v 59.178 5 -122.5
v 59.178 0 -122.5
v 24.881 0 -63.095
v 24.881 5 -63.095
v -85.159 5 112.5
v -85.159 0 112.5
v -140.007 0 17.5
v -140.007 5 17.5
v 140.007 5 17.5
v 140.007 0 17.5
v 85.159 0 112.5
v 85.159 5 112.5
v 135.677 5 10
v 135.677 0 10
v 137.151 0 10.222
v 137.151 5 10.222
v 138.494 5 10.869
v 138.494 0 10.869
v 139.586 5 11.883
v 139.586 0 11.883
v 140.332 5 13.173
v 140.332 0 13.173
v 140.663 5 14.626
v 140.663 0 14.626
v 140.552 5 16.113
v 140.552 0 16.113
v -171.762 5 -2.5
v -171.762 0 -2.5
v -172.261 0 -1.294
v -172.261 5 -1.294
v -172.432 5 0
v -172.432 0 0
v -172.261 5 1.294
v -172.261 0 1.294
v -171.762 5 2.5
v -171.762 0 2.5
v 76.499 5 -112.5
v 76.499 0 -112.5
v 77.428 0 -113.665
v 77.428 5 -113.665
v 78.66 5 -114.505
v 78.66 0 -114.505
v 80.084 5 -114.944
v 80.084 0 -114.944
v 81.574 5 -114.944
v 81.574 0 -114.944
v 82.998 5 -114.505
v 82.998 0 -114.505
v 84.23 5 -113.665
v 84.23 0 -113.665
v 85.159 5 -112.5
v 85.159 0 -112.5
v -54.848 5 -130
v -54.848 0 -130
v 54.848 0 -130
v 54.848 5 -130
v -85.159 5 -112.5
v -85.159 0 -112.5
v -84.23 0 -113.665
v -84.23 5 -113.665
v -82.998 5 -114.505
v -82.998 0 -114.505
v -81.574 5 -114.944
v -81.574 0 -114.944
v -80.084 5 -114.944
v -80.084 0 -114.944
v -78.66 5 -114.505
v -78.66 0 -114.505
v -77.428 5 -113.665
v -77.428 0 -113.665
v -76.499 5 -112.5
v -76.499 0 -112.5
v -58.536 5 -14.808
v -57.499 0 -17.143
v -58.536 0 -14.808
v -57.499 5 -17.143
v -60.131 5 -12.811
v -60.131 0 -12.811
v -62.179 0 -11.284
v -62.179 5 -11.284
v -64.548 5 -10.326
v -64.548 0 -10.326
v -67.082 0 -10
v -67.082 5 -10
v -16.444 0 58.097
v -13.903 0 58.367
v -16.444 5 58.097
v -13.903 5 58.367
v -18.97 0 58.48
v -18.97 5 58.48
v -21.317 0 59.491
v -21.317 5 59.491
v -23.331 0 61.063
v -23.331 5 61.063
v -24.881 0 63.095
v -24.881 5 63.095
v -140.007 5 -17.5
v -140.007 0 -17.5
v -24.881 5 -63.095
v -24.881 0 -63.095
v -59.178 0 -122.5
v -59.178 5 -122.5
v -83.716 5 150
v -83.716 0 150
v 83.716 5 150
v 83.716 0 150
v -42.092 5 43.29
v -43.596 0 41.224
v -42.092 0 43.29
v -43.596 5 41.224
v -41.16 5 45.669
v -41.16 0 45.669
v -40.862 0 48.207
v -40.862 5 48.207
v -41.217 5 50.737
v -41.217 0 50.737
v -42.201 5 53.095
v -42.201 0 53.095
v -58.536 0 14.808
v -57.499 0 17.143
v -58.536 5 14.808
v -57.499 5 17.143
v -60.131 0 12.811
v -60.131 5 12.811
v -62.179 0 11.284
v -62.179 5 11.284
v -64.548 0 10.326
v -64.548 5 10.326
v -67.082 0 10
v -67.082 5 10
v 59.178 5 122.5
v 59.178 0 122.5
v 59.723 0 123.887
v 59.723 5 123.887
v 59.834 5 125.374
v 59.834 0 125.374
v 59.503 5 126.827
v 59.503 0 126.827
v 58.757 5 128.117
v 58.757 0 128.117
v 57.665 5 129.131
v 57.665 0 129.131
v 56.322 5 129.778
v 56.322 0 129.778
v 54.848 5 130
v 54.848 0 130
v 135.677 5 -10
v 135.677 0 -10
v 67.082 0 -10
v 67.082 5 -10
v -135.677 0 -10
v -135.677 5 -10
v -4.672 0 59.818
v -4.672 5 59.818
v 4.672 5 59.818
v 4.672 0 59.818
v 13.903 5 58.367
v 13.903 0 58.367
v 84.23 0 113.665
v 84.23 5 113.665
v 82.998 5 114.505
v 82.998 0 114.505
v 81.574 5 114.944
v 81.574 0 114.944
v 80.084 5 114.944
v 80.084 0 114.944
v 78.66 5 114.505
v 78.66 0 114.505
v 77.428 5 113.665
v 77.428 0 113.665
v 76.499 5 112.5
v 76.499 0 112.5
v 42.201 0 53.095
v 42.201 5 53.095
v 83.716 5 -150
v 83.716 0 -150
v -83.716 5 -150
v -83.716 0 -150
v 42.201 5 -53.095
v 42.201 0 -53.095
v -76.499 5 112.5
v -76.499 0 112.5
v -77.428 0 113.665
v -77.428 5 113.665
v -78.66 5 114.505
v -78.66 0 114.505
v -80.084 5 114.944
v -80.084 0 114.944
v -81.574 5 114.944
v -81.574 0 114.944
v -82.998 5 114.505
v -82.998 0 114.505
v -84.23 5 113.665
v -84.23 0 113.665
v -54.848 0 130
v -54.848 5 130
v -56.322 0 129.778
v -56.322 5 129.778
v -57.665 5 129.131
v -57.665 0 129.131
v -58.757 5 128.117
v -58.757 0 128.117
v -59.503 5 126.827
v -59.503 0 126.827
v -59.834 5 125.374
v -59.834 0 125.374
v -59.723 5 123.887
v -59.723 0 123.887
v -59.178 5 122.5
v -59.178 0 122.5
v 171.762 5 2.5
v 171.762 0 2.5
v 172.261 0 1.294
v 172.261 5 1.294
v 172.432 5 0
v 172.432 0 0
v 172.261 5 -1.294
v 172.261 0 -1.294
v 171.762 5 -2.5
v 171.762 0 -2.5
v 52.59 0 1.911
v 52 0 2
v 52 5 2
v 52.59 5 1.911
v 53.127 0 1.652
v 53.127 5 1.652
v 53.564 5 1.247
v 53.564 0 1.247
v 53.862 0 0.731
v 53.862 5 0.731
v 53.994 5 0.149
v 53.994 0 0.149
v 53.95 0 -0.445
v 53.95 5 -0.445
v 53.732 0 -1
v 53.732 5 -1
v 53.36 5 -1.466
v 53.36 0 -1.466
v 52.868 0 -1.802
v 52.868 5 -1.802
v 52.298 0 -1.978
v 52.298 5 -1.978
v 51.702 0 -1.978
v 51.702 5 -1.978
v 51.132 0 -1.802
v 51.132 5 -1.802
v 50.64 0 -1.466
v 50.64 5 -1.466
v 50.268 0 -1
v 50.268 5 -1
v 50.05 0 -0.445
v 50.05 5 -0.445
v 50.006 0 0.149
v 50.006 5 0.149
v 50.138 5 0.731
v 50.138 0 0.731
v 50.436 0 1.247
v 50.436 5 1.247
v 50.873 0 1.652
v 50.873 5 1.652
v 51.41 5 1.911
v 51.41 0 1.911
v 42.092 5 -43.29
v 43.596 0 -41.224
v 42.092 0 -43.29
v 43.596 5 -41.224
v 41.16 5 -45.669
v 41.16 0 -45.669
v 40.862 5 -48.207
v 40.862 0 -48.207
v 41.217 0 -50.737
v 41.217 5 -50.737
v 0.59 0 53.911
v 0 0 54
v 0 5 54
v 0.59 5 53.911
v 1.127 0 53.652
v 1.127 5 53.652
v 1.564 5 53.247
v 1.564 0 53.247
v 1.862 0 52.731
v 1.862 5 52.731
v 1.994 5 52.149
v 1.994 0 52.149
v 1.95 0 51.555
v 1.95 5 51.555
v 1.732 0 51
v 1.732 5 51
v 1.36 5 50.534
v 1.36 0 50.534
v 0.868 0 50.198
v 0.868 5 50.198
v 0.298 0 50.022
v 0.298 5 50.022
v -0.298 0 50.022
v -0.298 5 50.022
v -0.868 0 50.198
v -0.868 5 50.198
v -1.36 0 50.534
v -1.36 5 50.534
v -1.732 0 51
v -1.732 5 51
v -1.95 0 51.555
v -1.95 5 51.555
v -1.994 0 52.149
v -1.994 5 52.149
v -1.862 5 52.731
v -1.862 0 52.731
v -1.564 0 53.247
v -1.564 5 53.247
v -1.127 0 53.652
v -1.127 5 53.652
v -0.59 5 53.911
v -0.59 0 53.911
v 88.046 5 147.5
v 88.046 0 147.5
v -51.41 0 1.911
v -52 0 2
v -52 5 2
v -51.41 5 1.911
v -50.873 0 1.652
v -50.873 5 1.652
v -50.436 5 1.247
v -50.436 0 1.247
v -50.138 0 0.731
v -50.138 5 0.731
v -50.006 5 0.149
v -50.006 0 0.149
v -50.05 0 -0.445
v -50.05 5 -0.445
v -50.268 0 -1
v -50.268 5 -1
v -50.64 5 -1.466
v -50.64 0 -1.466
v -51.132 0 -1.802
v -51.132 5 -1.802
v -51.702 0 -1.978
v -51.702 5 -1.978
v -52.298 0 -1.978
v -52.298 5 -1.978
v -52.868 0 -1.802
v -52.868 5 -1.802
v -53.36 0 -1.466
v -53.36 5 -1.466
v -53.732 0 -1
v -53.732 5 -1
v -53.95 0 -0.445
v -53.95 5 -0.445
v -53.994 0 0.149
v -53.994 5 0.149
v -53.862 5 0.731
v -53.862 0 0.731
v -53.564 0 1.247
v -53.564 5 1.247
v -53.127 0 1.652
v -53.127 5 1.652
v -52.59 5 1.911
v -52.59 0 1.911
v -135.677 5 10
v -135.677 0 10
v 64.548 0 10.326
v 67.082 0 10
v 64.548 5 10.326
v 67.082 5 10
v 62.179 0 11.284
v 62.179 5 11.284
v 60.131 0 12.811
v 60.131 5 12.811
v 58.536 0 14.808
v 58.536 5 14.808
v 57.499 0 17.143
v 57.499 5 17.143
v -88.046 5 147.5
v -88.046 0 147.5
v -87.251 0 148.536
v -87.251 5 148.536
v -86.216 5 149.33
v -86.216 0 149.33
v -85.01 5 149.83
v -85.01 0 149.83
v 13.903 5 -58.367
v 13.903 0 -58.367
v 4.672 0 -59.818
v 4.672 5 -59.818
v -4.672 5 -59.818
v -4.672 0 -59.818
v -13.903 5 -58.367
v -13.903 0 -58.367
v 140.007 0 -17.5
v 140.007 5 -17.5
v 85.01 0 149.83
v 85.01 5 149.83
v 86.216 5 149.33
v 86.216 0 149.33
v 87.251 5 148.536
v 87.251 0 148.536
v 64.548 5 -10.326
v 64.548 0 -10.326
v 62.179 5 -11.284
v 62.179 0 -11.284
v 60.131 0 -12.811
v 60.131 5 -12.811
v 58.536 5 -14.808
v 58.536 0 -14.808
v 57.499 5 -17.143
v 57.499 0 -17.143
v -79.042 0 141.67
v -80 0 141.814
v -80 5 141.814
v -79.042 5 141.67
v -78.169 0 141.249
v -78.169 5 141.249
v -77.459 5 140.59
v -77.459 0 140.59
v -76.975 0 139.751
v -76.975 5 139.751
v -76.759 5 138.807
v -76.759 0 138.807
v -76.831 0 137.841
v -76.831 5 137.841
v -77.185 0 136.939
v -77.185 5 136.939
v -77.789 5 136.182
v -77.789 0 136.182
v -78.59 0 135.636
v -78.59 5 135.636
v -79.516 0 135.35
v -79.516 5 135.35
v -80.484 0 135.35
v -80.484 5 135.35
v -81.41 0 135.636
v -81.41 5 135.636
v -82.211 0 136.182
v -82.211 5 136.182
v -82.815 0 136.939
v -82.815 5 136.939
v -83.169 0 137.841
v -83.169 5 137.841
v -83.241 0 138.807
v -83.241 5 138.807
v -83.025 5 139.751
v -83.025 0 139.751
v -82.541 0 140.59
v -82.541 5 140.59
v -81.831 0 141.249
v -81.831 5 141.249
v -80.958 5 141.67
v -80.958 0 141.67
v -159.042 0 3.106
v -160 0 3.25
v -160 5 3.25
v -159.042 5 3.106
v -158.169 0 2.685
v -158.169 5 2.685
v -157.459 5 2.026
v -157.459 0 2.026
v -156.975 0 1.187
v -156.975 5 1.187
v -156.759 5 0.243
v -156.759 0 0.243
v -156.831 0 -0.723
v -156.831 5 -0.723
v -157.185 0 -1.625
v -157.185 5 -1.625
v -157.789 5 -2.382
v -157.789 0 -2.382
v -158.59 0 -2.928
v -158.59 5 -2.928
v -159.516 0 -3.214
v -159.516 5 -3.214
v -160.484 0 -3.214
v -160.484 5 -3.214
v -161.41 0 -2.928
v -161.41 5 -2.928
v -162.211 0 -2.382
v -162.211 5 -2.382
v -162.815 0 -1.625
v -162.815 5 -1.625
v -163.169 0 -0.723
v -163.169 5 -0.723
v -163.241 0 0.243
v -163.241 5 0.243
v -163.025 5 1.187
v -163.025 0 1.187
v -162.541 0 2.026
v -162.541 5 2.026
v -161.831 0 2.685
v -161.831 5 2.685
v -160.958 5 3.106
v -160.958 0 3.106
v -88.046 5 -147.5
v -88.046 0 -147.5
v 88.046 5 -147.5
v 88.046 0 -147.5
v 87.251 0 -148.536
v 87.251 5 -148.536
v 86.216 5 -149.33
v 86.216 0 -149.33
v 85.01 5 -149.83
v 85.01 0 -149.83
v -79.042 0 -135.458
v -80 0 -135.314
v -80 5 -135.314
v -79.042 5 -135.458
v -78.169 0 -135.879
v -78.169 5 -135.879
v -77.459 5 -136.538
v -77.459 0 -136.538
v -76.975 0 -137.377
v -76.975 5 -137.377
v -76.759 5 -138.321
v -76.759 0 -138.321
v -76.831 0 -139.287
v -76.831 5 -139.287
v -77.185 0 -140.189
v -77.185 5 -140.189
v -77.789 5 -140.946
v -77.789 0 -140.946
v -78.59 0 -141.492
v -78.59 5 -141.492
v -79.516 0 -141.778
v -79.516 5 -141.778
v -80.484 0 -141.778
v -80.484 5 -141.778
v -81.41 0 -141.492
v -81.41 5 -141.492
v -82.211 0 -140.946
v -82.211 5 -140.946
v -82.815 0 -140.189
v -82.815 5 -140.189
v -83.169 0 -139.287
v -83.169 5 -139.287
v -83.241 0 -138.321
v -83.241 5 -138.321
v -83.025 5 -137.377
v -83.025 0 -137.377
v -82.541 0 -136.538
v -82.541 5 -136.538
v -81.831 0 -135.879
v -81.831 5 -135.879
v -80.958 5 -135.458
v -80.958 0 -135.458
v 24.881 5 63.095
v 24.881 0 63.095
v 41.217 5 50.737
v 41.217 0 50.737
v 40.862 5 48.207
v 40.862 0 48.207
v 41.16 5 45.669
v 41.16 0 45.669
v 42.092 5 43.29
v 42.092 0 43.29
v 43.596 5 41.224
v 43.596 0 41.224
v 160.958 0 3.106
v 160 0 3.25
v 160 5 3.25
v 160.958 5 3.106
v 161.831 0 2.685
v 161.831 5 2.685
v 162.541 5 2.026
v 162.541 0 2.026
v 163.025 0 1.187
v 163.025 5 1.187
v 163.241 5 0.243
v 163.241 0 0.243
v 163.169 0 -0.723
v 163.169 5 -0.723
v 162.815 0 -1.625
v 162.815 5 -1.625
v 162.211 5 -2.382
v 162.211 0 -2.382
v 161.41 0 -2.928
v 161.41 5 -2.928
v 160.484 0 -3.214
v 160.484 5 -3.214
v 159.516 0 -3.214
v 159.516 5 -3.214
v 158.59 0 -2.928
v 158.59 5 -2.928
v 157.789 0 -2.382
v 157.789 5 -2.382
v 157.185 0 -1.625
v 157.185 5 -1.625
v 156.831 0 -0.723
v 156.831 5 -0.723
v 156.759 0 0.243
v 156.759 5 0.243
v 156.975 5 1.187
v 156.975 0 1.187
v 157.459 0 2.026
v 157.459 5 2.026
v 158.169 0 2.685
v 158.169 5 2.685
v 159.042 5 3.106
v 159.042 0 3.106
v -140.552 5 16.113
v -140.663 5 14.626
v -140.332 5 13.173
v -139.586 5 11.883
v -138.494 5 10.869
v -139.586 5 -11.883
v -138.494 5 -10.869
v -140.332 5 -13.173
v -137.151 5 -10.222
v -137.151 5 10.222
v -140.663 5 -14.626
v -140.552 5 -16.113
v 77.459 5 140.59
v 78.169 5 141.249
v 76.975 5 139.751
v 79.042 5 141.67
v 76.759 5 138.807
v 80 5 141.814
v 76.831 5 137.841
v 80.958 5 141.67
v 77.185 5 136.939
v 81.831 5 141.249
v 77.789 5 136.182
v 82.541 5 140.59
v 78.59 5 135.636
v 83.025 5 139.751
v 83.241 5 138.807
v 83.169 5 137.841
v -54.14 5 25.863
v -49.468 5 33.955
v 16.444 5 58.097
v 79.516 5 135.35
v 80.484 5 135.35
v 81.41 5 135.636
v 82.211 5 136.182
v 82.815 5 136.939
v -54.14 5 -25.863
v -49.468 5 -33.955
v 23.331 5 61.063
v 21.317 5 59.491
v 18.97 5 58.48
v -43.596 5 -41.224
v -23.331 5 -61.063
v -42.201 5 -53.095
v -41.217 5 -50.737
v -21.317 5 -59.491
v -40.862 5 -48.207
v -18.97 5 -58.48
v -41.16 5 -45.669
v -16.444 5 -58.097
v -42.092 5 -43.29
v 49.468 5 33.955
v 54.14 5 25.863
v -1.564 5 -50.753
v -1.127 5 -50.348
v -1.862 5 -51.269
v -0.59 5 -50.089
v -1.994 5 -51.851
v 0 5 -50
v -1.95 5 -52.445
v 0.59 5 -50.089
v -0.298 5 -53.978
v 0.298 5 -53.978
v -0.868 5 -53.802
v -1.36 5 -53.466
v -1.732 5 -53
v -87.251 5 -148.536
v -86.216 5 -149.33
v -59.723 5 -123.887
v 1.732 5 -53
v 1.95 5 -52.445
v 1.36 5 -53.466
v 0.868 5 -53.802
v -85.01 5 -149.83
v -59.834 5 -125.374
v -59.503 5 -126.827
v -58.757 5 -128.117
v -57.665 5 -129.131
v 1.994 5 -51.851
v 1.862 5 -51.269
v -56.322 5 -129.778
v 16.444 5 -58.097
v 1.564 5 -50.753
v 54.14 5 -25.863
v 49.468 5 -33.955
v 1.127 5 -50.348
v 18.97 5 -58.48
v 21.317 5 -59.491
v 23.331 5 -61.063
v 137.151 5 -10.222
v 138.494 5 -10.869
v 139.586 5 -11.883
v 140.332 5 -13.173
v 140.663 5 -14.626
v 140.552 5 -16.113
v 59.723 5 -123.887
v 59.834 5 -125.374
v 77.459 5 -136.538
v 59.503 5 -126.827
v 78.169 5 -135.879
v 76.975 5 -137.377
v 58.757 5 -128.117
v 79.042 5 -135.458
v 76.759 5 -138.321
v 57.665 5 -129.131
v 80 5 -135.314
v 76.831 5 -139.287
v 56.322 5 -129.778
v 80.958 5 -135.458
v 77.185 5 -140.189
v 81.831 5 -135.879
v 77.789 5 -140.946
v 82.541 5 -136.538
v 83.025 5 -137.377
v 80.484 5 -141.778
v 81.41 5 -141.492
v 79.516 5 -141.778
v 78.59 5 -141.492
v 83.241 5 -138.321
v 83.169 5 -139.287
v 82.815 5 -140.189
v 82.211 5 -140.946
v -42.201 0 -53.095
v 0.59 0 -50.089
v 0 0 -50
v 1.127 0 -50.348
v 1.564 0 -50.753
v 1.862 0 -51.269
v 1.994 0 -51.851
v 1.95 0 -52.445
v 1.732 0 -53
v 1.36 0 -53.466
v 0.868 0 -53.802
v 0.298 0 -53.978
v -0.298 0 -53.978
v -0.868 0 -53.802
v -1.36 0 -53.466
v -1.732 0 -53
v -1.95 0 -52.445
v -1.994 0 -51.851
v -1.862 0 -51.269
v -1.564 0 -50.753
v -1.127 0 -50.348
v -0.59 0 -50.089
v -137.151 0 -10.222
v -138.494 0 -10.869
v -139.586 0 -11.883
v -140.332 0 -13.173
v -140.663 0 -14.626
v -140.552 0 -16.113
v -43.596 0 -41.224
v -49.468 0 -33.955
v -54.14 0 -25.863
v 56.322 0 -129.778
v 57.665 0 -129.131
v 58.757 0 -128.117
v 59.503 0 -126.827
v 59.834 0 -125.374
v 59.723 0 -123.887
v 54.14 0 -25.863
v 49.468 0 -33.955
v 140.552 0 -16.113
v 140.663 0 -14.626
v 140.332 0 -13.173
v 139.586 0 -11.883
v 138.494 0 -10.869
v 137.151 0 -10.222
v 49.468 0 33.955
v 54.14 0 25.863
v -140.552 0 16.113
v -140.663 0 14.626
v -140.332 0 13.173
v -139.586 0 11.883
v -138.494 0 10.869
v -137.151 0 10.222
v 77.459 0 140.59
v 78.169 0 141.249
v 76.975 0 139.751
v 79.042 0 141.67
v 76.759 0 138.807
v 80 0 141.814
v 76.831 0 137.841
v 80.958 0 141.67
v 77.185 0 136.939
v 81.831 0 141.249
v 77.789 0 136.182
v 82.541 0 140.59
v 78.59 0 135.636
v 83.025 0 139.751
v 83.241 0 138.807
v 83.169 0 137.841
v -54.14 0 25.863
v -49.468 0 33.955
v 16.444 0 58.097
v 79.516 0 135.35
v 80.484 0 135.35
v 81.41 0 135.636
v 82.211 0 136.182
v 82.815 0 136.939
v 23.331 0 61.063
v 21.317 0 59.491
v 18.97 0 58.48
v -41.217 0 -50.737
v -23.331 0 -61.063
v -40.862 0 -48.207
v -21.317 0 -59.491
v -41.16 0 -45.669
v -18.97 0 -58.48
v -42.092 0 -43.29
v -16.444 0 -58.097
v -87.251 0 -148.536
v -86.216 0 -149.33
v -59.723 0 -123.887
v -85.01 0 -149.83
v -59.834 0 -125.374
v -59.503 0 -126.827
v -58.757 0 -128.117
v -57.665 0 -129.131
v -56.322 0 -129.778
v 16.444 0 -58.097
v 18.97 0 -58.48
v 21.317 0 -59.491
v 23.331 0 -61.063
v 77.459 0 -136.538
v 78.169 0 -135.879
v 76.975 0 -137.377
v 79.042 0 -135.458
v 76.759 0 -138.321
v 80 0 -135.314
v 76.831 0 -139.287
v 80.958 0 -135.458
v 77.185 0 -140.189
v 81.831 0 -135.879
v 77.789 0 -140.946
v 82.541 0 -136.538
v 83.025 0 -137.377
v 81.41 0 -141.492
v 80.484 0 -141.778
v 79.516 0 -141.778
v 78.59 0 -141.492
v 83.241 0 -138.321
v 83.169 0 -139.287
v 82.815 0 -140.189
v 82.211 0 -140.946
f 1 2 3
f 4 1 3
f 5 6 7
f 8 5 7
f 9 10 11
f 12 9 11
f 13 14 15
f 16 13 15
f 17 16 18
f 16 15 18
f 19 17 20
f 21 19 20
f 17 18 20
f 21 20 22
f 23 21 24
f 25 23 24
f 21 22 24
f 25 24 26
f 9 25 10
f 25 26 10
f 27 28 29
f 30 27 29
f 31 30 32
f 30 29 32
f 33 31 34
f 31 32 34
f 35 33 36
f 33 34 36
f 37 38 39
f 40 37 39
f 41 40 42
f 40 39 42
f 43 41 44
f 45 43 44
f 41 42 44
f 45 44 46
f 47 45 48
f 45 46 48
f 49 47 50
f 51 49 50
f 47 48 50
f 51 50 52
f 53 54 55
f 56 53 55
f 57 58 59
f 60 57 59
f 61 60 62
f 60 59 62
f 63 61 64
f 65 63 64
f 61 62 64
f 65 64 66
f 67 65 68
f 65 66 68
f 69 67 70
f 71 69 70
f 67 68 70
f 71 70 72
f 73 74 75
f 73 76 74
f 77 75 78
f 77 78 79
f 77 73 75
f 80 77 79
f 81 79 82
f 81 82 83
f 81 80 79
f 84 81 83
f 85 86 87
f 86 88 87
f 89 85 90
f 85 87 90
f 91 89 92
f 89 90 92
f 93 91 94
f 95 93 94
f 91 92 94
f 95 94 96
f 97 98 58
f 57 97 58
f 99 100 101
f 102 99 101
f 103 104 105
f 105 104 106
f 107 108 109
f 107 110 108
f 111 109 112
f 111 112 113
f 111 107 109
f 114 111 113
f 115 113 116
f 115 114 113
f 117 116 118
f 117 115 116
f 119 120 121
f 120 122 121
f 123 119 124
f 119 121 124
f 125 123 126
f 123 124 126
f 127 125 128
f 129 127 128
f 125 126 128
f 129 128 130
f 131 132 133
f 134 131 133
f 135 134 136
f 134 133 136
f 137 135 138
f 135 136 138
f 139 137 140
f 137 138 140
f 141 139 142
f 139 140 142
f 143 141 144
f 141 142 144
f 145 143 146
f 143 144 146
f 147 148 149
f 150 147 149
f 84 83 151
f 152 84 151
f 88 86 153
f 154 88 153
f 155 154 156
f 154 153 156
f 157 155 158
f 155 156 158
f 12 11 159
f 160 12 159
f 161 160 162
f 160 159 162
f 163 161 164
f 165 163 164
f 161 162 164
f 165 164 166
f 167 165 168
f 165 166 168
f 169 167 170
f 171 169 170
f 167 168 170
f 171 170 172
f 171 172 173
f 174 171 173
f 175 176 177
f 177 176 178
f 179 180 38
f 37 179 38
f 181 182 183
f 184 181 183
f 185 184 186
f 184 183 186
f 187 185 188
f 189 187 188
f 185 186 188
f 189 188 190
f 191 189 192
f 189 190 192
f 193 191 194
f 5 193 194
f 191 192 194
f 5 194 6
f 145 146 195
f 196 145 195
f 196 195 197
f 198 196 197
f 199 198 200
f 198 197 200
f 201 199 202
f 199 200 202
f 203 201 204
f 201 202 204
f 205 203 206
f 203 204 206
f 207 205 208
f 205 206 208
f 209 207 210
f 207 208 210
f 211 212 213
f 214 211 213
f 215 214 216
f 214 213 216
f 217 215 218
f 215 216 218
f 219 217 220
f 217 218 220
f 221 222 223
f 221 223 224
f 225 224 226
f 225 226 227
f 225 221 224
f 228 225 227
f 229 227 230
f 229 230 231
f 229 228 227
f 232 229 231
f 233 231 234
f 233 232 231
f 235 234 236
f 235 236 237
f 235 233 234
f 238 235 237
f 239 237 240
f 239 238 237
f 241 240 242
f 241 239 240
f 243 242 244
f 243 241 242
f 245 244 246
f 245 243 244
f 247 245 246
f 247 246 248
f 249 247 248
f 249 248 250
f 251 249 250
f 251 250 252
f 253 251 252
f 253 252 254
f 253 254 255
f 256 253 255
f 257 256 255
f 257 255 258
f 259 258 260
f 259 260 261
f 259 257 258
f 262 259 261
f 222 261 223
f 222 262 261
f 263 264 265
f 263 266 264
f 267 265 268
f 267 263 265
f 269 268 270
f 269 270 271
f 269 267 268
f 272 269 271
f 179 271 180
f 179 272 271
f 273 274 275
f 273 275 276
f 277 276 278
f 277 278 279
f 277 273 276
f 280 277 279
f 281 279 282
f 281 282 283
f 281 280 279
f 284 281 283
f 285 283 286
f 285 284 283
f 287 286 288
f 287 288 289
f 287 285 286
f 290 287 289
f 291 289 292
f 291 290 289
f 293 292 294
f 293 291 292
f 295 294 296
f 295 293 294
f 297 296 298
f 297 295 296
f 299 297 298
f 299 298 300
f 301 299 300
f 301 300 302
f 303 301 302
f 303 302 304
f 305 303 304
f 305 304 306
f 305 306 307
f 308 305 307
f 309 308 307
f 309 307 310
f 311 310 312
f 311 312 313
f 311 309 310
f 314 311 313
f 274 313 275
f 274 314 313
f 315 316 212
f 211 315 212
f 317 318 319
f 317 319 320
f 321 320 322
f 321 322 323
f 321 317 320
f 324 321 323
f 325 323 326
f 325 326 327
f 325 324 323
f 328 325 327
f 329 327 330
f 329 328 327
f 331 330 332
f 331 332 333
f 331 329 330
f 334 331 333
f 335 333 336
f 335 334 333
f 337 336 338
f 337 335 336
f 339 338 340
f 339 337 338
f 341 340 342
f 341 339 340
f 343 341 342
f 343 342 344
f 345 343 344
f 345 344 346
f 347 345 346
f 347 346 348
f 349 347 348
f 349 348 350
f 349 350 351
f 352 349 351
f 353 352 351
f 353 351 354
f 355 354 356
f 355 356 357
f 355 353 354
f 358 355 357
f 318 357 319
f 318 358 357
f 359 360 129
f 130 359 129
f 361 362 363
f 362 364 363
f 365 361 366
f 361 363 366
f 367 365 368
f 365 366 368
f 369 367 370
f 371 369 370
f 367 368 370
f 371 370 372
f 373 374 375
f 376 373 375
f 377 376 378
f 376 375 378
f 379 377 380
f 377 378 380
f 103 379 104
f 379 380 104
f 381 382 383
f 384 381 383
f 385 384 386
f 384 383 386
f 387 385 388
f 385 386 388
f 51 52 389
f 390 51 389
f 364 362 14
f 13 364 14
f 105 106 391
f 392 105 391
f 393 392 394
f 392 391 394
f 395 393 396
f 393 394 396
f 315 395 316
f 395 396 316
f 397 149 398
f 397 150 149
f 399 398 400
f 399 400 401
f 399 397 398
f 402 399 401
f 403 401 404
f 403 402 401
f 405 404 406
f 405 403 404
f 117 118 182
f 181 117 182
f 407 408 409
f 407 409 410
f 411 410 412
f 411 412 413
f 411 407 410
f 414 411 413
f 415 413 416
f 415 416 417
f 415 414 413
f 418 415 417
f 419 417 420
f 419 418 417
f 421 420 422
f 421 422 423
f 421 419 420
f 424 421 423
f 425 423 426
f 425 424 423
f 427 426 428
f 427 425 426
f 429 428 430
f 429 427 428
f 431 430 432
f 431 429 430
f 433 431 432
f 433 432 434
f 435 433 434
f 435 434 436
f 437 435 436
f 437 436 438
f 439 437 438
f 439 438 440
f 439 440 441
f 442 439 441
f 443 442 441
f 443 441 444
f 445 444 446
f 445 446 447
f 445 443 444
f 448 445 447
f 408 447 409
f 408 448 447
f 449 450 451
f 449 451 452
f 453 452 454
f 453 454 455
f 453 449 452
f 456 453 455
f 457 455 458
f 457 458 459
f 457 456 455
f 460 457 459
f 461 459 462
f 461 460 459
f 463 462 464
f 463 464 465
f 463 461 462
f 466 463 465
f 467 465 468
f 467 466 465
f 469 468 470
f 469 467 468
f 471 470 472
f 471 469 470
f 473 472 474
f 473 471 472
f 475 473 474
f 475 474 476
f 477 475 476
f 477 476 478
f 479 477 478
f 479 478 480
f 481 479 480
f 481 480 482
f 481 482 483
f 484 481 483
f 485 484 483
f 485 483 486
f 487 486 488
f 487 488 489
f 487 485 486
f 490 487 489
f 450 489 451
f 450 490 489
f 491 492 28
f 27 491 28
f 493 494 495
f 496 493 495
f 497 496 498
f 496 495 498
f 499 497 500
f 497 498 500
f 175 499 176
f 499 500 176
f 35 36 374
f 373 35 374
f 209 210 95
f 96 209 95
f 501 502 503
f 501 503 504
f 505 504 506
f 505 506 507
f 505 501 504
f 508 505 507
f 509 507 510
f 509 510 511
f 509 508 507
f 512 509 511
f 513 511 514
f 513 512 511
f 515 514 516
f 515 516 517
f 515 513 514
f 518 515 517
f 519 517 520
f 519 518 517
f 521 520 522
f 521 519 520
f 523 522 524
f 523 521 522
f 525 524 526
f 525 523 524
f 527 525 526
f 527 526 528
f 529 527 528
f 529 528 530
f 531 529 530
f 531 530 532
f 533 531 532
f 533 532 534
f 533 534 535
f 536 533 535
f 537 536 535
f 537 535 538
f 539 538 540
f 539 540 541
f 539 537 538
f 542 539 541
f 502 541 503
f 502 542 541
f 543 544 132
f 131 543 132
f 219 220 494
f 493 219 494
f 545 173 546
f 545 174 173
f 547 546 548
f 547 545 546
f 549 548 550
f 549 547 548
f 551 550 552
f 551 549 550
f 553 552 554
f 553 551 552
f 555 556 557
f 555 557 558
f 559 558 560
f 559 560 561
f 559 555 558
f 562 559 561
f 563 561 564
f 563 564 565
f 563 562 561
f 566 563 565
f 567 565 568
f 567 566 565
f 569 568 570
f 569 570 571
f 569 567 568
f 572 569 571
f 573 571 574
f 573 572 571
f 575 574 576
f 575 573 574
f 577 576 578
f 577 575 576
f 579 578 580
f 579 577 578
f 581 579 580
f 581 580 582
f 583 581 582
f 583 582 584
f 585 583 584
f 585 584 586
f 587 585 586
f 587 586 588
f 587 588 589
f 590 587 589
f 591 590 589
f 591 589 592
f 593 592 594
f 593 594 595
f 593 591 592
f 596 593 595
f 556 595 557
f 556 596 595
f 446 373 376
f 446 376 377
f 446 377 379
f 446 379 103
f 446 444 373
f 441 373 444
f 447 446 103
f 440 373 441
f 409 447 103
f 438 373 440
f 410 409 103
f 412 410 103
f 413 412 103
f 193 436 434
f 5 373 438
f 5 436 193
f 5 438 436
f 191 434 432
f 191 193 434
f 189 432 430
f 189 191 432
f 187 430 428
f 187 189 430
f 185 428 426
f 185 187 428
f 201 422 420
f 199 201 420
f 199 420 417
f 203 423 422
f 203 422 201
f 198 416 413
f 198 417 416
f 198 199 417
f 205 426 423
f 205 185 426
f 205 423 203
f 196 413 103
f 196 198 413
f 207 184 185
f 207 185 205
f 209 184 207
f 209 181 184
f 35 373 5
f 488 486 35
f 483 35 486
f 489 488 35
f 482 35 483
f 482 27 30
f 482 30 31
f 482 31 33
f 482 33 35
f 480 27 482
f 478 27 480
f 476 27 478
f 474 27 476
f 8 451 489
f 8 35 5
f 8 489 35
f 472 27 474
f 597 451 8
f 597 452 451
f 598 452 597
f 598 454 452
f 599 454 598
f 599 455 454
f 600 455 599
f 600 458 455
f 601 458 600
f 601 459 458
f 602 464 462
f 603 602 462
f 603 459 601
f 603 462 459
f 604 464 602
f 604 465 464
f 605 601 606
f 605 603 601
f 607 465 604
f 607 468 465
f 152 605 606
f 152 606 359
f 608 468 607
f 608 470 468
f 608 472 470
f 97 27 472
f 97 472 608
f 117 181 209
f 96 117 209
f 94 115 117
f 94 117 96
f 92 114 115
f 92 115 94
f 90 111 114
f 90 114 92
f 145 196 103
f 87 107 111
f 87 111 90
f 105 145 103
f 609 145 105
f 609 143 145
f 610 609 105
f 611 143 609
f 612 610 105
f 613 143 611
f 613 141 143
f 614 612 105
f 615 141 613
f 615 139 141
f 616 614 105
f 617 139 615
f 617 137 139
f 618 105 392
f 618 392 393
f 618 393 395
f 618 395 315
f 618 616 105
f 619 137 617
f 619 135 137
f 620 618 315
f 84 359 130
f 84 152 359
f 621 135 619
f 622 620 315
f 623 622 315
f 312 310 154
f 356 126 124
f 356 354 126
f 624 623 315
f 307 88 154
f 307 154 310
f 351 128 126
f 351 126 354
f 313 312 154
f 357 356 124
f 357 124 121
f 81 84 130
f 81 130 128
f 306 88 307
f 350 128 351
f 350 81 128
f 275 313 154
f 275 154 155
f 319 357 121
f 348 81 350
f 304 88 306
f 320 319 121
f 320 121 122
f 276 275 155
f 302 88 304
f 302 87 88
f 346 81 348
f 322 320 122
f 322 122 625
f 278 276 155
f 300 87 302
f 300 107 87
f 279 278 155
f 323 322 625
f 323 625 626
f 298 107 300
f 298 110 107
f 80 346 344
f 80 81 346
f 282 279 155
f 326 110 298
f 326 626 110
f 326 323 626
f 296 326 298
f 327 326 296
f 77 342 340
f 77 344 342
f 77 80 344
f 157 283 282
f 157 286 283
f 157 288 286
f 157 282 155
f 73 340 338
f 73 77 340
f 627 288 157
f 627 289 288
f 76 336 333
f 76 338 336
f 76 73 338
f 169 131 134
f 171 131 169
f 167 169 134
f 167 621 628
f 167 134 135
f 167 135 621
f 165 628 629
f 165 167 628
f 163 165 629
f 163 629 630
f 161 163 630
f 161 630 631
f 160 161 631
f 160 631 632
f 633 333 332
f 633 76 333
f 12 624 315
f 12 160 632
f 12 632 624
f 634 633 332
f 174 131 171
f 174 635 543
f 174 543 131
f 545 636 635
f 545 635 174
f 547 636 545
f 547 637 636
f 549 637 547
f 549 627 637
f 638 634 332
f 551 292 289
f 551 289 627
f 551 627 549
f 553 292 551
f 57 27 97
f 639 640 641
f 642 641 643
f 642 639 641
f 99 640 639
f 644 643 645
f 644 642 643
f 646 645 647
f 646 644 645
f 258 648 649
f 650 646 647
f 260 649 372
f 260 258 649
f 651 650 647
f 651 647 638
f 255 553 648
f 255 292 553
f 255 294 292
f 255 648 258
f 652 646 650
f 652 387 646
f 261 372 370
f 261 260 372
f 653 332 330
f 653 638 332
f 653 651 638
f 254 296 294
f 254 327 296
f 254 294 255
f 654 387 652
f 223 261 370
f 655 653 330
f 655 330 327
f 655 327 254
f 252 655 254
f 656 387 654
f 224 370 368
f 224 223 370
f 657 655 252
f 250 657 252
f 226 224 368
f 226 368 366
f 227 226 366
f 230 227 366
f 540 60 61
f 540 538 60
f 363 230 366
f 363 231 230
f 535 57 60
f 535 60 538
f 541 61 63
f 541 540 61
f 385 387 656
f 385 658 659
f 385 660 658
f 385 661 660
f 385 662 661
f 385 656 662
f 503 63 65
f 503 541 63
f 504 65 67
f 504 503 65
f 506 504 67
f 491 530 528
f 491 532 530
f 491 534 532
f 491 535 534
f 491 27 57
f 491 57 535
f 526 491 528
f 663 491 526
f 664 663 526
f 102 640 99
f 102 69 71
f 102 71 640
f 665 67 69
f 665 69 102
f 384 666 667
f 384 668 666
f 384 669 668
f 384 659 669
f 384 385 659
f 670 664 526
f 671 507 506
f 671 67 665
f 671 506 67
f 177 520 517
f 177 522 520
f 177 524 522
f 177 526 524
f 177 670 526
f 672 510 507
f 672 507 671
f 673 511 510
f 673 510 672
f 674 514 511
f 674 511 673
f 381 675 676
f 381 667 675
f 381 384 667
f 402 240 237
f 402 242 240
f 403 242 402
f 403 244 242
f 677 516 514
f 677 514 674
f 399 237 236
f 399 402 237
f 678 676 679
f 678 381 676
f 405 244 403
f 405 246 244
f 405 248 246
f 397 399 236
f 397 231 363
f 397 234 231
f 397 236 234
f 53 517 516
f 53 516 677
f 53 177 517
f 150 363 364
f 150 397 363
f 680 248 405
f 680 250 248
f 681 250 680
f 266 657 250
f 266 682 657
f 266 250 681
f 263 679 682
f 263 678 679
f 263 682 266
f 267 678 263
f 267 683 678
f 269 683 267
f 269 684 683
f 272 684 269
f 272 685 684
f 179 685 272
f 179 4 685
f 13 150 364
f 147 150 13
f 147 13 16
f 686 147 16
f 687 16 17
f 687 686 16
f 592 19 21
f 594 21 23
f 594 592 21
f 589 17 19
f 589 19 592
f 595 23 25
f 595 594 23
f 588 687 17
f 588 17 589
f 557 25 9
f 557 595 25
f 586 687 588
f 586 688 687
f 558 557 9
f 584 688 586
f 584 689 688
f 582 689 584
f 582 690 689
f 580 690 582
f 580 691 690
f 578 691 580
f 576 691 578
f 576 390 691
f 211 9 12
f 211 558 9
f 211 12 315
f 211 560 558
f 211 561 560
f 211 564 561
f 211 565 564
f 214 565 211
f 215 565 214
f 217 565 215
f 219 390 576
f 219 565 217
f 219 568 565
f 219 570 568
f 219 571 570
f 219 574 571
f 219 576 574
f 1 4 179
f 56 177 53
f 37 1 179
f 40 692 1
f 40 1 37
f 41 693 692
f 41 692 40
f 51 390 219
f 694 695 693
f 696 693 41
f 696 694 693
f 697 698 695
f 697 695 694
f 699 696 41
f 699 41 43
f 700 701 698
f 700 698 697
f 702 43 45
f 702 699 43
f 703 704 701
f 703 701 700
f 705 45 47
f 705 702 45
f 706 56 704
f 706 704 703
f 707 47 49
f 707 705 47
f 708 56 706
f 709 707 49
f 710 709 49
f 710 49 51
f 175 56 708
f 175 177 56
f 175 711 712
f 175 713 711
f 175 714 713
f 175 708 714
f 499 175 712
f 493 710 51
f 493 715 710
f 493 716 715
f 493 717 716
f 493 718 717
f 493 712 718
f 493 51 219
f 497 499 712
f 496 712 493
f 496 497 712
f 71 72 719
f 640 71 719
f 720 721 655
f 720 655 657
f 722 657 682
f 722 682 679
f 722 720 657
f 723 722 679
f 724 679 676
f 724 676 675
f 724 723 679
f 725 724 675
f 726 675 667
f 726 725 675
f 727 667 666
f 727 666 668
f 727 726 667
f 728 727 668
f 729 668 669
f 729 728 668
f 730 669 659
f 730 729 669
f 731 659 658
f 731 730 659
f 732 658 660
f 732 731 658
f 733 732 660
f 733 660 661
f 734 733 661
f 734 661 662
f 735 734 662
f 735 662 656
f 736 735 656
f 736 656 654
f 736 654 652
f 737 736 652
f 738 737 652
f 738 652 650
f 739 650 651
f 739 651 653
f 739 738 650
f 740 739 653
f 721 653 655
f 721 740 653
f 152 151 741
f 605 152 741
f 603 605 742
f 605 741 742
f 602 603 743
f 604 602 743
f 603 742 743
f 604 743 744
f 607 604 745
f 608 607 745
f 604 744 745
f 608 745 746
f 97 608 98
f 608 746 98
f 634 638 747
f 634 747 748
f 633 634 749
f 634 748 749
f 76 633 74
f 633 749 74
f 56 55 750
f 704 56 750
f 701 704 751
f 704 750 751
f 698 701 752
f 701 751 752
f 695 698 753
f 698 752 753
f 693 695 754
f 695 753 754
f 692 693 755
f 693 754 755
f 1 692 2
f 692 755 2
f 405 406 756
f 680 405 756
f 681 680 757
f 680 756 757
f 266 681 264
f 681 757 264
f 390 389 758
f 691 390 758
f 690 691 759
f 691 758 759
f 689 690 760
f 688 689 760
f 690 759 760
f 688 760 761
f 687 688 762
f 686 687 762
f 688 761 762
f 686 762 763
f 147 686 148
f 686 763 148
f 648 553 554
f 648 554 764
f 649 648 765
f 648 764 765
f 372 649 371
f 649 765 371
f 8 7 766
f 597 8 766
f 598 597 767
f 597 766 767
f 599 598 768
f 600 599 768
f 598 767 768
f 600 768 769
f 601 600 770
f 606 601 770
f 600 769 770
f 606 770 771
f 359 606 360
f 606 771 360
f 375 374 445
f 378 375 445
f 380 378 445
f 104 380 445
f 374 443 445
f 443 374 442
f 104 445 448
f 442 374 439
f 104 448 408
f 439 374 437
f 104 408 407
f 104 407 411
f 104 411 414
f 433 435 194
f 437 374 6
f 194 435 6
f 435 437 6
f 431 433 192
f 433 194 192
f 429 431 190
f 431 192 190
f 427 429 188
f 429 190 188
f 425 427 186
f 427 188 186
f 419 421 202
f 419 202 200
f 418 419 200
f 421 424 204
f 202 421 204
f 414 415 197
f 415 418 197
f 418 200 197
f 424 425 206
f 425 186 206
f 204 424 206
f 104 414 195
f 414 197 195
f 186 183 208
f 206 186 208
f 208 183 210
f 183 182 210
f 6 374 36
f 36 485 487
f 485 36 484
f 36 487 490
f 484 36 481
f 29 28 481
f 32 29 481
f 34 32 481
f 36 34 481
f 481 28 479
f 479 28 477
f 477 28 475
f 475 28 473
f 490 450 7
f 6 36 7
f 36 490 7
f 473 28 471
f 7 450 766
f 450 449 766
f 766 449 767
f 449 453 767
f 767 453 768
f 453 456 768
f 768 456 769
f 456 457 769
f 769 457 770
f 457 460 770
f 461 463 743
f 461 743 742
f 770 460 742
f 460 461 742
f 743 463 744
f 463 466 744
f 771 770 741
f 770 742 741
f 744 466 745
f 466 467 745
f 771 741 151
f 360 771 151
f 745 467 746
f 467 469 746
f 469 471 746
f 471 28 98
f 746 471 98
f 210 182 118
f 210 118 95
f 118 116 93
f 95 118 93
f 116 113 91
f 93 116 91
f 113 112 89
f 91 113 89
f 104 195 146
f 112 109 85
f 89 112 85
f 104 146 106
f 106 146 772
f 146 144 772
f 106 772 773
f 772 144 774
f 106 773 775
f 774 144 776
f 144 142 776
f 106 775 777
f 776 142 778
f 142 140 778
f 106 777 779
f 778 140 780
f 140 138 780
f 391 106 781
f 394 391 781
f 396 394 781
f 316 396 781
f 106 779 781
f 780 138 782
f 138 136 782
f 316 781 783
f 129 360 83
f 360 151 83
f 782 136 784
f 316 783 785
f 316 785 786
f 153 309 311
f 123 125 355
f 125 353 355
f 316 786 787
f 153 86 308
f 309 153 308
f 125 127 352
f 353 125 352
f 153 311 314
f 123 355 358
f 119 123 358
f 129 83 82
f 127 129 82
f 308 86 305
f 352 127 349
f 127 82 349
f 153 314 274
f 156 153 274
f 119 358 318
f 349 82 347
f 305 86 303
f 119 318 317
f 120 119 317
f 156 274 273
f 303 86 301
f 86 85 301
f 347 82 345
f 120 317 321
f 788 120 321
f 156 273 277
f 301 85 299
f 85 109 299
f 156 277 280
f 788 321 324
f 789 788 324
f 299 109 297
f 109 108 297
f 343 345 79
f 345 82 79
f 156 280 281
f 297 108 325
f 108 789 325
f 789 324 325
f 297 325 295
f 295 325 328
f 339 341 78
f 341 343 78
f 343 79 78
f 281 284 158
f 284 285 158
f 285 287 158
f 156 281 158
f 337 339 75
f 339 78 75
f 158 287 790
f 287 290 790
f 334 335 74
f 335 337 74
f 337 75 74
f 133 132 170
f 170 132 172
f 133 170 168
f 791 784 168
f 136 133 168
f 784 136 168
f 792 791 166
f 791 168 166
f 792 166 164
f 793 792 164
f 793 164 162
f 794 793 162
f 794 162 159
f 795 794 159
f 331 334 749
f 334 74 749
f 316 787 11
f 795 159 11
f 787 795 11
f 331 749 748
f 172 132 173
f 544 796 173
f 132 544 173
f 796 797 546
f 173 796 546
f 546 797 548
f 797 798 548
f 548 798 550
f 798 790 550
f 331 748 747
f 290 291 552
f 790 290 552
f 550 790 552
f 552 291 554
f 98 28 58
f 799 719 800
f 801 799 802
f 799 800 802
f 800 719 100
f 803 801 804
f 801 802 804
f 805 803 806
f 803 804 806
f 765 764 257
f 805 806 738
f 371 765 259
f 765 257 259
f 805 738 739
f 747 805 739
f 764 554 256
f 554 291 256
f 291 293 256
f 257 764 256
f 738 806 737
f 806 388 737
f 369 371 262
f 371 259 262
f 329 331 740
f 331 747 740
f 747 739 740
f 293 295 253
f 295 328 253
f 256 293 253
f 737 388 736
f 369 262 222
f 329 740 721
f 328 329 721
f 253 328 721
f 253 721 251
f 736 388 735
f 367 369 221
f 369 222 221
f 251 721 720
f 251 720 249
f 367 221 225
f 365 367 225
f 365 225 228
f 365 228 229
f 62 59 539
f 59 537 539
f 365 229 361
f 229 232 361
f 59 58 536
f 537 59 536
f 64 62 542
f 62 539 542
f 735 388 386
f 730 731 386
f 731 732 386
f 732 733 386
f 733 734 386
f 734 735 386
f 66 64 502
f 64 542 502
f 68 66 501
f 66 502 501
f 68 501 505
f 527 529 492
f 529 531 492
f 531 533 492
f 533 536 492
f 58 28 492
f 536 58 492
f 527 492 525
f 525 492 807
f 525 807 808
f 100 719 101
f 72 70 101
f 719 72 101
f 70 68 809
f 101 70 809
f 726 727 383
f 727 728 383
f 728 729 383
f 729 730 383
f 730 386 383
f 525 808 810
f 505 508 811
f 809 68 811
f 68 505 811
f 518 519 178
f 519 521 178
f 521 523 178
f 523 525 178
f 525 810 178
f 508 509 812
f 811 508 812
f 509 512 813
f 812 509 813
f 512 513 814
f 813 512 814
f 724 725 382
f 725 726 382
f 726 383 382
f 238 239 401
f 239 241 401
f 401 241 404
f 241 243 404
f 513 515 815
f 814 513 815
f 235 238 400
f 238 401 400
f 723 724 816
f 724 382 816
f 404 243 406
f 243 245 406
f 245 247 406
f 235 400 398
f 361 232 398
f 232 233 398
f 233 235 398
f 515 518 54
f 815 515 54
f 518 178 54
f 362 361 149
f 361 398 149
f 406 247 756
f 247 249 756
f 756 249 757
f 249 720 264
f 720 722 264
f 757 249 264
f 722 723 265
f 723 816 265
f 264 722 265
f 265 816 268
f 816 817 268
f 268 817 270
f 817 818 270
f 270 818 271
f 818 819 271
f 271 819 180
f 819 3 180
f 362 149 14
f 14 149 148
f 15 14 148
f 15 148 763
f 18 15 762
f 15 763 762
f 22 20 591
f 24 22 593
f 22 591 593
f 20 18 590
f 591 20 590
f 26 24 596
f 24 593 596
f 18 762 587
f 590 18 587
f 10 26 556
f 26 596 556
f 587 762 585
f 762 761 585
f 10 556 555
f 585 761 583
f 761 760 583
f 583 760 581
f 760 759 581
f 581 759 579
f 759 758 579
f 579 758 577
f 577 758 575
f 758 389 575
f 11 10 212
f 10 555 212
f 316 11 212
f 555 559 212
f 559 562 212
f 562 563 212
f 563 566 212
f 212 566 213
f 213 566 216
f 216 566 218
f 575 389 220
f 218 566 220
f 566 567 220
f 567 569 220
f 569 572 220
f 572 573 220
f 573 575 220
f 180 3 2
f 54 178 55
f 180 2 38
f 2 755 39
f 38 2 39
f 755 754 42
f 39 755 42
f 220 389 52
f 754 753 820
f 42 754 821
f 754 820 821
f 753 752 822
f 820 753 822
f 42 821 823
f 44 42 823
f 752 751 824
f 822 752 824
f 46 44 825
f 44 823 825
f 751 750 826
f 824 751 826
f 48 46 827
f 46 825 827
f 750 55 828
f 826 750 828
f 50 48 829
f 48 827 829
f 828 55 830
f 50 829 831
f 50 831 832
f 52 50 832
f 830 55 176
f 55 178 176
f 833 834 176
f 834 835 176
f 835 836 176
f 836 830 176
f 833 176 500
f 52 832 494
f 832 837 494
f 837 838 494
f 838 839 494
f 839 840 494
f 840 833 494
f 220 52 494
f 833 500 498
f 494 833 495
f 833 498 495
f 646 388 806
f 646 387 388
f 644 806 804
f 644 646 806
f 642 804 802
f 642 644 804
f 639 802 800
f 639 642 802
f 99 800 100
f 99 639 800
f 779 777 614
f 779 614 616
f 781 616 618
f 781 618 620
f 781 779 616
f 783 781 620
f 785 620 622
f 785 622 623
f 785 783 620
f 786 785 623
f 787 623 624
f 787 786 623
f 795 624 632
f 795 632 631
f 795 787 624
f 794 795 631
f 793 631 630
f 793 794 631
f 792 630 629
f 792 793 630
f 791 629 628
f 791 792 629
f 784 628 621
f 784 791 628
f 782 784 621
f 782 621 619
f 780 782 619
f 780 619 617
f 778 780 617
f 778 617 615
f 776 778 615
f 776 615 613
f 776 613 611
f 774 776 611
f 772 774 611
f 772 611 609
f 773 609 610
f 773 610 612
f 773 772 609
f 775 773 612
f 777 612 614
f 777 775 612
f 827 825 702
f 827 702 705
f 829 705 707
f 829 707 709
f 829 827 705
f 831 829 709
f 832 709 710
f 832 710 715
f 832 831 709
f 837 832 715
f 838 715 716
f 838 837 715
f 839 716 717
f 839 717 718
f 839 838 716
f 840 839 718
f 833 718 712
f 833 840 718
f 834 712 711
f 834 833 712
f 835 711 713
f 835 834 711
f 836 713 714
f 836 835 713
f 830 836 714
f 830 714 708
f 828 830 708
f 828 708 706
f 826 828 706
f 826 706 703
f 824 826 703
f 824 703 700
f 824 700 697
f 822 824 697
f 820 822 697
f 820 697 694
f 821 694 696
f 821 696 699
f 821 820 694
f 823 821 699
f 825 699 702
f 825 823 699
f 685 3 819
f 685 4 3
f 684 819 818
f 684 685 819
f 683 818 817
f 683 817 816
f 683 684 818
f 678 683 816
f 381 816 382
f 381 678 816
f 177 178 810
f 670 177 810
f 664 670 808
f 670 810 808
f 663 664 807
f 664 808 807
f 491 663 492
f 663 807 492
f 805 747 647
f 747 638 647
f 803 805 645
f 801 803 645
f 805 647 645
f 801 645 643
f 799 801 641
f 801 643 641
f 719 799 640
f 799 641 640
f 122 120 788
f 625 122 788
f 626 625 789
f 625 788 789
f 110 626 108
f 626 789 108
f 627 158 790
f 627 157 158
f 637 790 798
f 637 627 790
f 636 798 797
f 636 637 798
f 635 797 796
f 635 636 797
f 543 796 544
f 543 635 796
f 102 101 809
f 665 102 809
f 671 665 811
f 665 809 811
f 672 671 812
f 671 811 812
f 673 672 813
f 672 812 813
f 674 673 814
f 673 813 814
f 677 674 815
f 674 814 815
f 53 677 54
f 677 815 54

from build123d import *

# Parameters (mm, degrees)
SKETCH1_R           = 3.25
SKETCH1_R_2         = 2
BOSS_EXTRUDE1_DEPTH = 5
FILLET2_R           = 10


with BuildPart() as part:
    # Sketch1 → Boss-Extrude1 (new body)
    with BuildSketch(Plane(origin=(0, 0, 0), x_dir=(1, 0, 0), z_dir=(0, 1, 0))):
        with BuildLine():
            ThreePointArc((171.761705084, -2.5), (172.431578065, 0), (171.761705084, 2.5))
            Line((171.761705084, 2.5), (88.045916051, 147.5))
            ThreePointArc((88.045916051, 147.5), (86.215789032, 149.330127019), (83.715789032, 150))
            Line((83.715789032, 150), (-83.715789032, 150))
            ThreePointArc((-83.715789032, 150), (-86.215789032, 149.330127019), (-88.045916051, 147.5))
            Line((-88.045916051, 147.5), (-171.761705084, 2.5))
            ThreePointArc((-171.761705084, 2.5), (-172.431578065, 0), (-171.761705084, -2.5))
            Line((-171.761705084, -2.5), (-88.045916051, -147.5))
            ThreePointArc((-88.045916051, -147.5), (-86.215789032, -149.330127019), (-83.715789032, -150))
            Line((-83.715789032, -150), (83.715789032, -150))
            ThreePointArc((83.715789032, -150), (86.215789032, -149.330127019), (88.045916051, -147.5))
            Line((88.045916051, -147.5), (171.761705084, -2.5))
        make_face()
        with Locations(Location((-80, -138.564064606, 0), (0, 0, 270))):
            Circle(SKETCH1_R, mode=Mode.SUBTRACT)
        with BuildLine():
            Line((20.920144878, -56.23475383), (59.178402592, -122.5))
            ThreePointArc((59.178402592, -122.5), (59.178402592, -127.5), (54.848275573, -130))
            Line((54.848275573, -130), (-54.848275573, -130))
            ThreePointArc((-54.848275573, -130), (-59.178402592, -127.5), (-59.178402592, -122.5))
            Line((-59.178402592, -122.5), (-20.920144878, -56.23475383))
            ThreePointArc((-20.920144878, -56.23475383), (0, -60), (20.920144878, -56.23475383))
        make_face(mode=Mode.SUBTRACT)
        with BuildLine():
            Line((-38.240652953, -46.23475383), (-76.498910668, -112.5))
            ThreePointArc((-76.498910668, -112.5), (-80.829037687, -115), (-85.159164705, -112.5))
            Line((-85.159164705, -112.5), (-140.007440278, -17.5))
            ThreePointArc((-140.007440278, -17.5), (-140.007440278, -12.5), (-135.67731326, -10))
            Line((-135.67731326, -10), (-59.160797831, -10))
            ThreePointArc((-59.160797831, -10), (-51.961524227, -30), (-38.240652953, -46.23475383))
        make_face(mode=Mode.SUBTRACT)
        with Locations(Location((-160, 0, 0), (0, 0, 270))):
            Circle(SKETCH1_R, mode=Mode.SUBTRACT)
        with Locations(Location((0, -52, 0), (0, 0, 270))):
            Circle(SKETCH1_R_2, mode=Mode.SUBTRACT)
        with Locations(Location((-52, 0, 0), (0, 0, 270))):
            Circle(SKETCH1_R_2, mode=Mode.SUBTRACT)
        with Locations(Location((80, -138.564064606, 0), (0, 0, 270))):
            Circle(SKETCH1_R, mode=Mode.SUBTRACT)
        with Locations(Location((52, 0, 0), (0, 0, 270))):
            Circle(SKETCH1_R_2, mode=Mode.SUBTRACT)
        with BuildLine():
            ThreePointArc((85.159164705, -112.5), (80.829037687, -115), (76.498910668, -112.5))
            Line((76.498910668, -112.5), (38.240652953, -46.23475383))
            ThreePointArc((38.240652953, -46.23475383), (51.961524227, -30), (59.160797831, -10))
            Line((59.160797831, -10), (135.67731326, -10))
            ThreePointArc((135.67731326, -10), (140.007440278, -12.5), (140.007440278, -17.5))
            Line((140.007440278, -17.5), (85.159164705, -112.5))
        make_face(mode=Mode.SUBTRACT)
        with BuildLine():
            Line((-59.160797831, 10), (-135.67731326, 10))
            ThreePointArc((-135.67731326, 10), (-140.007440278, 12.5), (-140.007440278, 17.5))
            Line((-140.007440278, 17.5), (-85.159164705, 112.5))
            ThreePointArc((-85.159164705, 112.5), (-80.829037687, 115), (-76.498910668, 112.5))
            Line((-76.498910668, 112.5), (-38.240652953, 46.23475383))
            ThreePointArc((-38.240652953, 46.23475383), (-51.961524227, 30), (-59.160797831, 10))
        make_face(mode=Mode.SUBTRACT)
        with Locations(Location((0, 52, 0), (0, 0, 270))):
            Circle(SKETCH1_R_2, mode=Mode.SUBTRACT)
        with BuildLine():
            Line((59.178402592, 122.5), (20.920144878, 56.23475383))
            ThreePointArc((20.920144878, 56.23475383), (0, 60), (-20.920144878, 56.23475383))
            Line((-20.920144878, 56.23475383), (-59.178402592, 122.5))
            ThreePointArc((-59.178402592, 122.5), (-59.178402592, 127.5), (-54.848275573, 130))
            Line((-54.848275573, 130), (54.848275573, 130))
            ThreePointArc((54.848275573, 130), (59.178402592, 127.5), (59.178402592, 122.5))
        make_face(mode=Mode.SUBTRACT)
        with Locations(Location((-80, 138.564064606, 0), (0, 0, 270))):
            Circle(SKETCH1_R, mode=Mode.SUBTRACT)
        with Locations(Location((160, 0, 0), (0, 0, 270))):
            Circle(SKETCH1_R, mode=Mode.SUBTRACT)
        with BuildLine():
            Line((135.67731326, 10), (59.160797831, 10))
            ThreePointArc((59.160797831, 10), (51.961524227, 30), (38.240652953, 46.23475383))
            Line((38.240652953, 46.23475383), (76.498910668, 112.5))
            ThreePointArc((76.498910668, 112.5), (80.829037687, 115), (85.159164705, 112.5))
            Line((85.159164705, 112.5), (140.007440278, 17.5))
            ThreePointArc((140.007440278, 17.5), (140.007440278, 12.5), (135.67731326, 10))
        make_face(mode=Mode.SUBTRACT)
        with Locations(Location((80, 138.564064606, 0), (0, 0, 270))):
            Circle(SKETCH1_R, mode=Mode.SUBTRACT)
    extrude(amount=BOSS_EXTRUDE1_DEPTH)

    # Fillet2
    fillet2_edges = [part.edges().sort_by_distance(p)[0] for p in [
        (-59.160797831, 2.5, -10),
        (-59.160797831, 2.5, 10),
        (-38.240652953, 2.5, 46.23475383),
        (-20.920144878, 2.5, 56.23475383),
        (20.920144878, 2.5, 56.23475383),
        (38.240652953, 2.5, 46.23475383),
        (59.160797831, 2.5, 10),
        (59.160797831, 2.5, -10),
        (38.240652953, 2.5, -46.23475383),
        (20.920144878, 2.5, -56.23475383),
        (-20.920144878, 2.5, -56.23475383),
        (-38.240652953, 2.5, -46.23475383),
    ]]
    fillet(fillet2_edges, radius=FILLET2_R)


solid = part.part
